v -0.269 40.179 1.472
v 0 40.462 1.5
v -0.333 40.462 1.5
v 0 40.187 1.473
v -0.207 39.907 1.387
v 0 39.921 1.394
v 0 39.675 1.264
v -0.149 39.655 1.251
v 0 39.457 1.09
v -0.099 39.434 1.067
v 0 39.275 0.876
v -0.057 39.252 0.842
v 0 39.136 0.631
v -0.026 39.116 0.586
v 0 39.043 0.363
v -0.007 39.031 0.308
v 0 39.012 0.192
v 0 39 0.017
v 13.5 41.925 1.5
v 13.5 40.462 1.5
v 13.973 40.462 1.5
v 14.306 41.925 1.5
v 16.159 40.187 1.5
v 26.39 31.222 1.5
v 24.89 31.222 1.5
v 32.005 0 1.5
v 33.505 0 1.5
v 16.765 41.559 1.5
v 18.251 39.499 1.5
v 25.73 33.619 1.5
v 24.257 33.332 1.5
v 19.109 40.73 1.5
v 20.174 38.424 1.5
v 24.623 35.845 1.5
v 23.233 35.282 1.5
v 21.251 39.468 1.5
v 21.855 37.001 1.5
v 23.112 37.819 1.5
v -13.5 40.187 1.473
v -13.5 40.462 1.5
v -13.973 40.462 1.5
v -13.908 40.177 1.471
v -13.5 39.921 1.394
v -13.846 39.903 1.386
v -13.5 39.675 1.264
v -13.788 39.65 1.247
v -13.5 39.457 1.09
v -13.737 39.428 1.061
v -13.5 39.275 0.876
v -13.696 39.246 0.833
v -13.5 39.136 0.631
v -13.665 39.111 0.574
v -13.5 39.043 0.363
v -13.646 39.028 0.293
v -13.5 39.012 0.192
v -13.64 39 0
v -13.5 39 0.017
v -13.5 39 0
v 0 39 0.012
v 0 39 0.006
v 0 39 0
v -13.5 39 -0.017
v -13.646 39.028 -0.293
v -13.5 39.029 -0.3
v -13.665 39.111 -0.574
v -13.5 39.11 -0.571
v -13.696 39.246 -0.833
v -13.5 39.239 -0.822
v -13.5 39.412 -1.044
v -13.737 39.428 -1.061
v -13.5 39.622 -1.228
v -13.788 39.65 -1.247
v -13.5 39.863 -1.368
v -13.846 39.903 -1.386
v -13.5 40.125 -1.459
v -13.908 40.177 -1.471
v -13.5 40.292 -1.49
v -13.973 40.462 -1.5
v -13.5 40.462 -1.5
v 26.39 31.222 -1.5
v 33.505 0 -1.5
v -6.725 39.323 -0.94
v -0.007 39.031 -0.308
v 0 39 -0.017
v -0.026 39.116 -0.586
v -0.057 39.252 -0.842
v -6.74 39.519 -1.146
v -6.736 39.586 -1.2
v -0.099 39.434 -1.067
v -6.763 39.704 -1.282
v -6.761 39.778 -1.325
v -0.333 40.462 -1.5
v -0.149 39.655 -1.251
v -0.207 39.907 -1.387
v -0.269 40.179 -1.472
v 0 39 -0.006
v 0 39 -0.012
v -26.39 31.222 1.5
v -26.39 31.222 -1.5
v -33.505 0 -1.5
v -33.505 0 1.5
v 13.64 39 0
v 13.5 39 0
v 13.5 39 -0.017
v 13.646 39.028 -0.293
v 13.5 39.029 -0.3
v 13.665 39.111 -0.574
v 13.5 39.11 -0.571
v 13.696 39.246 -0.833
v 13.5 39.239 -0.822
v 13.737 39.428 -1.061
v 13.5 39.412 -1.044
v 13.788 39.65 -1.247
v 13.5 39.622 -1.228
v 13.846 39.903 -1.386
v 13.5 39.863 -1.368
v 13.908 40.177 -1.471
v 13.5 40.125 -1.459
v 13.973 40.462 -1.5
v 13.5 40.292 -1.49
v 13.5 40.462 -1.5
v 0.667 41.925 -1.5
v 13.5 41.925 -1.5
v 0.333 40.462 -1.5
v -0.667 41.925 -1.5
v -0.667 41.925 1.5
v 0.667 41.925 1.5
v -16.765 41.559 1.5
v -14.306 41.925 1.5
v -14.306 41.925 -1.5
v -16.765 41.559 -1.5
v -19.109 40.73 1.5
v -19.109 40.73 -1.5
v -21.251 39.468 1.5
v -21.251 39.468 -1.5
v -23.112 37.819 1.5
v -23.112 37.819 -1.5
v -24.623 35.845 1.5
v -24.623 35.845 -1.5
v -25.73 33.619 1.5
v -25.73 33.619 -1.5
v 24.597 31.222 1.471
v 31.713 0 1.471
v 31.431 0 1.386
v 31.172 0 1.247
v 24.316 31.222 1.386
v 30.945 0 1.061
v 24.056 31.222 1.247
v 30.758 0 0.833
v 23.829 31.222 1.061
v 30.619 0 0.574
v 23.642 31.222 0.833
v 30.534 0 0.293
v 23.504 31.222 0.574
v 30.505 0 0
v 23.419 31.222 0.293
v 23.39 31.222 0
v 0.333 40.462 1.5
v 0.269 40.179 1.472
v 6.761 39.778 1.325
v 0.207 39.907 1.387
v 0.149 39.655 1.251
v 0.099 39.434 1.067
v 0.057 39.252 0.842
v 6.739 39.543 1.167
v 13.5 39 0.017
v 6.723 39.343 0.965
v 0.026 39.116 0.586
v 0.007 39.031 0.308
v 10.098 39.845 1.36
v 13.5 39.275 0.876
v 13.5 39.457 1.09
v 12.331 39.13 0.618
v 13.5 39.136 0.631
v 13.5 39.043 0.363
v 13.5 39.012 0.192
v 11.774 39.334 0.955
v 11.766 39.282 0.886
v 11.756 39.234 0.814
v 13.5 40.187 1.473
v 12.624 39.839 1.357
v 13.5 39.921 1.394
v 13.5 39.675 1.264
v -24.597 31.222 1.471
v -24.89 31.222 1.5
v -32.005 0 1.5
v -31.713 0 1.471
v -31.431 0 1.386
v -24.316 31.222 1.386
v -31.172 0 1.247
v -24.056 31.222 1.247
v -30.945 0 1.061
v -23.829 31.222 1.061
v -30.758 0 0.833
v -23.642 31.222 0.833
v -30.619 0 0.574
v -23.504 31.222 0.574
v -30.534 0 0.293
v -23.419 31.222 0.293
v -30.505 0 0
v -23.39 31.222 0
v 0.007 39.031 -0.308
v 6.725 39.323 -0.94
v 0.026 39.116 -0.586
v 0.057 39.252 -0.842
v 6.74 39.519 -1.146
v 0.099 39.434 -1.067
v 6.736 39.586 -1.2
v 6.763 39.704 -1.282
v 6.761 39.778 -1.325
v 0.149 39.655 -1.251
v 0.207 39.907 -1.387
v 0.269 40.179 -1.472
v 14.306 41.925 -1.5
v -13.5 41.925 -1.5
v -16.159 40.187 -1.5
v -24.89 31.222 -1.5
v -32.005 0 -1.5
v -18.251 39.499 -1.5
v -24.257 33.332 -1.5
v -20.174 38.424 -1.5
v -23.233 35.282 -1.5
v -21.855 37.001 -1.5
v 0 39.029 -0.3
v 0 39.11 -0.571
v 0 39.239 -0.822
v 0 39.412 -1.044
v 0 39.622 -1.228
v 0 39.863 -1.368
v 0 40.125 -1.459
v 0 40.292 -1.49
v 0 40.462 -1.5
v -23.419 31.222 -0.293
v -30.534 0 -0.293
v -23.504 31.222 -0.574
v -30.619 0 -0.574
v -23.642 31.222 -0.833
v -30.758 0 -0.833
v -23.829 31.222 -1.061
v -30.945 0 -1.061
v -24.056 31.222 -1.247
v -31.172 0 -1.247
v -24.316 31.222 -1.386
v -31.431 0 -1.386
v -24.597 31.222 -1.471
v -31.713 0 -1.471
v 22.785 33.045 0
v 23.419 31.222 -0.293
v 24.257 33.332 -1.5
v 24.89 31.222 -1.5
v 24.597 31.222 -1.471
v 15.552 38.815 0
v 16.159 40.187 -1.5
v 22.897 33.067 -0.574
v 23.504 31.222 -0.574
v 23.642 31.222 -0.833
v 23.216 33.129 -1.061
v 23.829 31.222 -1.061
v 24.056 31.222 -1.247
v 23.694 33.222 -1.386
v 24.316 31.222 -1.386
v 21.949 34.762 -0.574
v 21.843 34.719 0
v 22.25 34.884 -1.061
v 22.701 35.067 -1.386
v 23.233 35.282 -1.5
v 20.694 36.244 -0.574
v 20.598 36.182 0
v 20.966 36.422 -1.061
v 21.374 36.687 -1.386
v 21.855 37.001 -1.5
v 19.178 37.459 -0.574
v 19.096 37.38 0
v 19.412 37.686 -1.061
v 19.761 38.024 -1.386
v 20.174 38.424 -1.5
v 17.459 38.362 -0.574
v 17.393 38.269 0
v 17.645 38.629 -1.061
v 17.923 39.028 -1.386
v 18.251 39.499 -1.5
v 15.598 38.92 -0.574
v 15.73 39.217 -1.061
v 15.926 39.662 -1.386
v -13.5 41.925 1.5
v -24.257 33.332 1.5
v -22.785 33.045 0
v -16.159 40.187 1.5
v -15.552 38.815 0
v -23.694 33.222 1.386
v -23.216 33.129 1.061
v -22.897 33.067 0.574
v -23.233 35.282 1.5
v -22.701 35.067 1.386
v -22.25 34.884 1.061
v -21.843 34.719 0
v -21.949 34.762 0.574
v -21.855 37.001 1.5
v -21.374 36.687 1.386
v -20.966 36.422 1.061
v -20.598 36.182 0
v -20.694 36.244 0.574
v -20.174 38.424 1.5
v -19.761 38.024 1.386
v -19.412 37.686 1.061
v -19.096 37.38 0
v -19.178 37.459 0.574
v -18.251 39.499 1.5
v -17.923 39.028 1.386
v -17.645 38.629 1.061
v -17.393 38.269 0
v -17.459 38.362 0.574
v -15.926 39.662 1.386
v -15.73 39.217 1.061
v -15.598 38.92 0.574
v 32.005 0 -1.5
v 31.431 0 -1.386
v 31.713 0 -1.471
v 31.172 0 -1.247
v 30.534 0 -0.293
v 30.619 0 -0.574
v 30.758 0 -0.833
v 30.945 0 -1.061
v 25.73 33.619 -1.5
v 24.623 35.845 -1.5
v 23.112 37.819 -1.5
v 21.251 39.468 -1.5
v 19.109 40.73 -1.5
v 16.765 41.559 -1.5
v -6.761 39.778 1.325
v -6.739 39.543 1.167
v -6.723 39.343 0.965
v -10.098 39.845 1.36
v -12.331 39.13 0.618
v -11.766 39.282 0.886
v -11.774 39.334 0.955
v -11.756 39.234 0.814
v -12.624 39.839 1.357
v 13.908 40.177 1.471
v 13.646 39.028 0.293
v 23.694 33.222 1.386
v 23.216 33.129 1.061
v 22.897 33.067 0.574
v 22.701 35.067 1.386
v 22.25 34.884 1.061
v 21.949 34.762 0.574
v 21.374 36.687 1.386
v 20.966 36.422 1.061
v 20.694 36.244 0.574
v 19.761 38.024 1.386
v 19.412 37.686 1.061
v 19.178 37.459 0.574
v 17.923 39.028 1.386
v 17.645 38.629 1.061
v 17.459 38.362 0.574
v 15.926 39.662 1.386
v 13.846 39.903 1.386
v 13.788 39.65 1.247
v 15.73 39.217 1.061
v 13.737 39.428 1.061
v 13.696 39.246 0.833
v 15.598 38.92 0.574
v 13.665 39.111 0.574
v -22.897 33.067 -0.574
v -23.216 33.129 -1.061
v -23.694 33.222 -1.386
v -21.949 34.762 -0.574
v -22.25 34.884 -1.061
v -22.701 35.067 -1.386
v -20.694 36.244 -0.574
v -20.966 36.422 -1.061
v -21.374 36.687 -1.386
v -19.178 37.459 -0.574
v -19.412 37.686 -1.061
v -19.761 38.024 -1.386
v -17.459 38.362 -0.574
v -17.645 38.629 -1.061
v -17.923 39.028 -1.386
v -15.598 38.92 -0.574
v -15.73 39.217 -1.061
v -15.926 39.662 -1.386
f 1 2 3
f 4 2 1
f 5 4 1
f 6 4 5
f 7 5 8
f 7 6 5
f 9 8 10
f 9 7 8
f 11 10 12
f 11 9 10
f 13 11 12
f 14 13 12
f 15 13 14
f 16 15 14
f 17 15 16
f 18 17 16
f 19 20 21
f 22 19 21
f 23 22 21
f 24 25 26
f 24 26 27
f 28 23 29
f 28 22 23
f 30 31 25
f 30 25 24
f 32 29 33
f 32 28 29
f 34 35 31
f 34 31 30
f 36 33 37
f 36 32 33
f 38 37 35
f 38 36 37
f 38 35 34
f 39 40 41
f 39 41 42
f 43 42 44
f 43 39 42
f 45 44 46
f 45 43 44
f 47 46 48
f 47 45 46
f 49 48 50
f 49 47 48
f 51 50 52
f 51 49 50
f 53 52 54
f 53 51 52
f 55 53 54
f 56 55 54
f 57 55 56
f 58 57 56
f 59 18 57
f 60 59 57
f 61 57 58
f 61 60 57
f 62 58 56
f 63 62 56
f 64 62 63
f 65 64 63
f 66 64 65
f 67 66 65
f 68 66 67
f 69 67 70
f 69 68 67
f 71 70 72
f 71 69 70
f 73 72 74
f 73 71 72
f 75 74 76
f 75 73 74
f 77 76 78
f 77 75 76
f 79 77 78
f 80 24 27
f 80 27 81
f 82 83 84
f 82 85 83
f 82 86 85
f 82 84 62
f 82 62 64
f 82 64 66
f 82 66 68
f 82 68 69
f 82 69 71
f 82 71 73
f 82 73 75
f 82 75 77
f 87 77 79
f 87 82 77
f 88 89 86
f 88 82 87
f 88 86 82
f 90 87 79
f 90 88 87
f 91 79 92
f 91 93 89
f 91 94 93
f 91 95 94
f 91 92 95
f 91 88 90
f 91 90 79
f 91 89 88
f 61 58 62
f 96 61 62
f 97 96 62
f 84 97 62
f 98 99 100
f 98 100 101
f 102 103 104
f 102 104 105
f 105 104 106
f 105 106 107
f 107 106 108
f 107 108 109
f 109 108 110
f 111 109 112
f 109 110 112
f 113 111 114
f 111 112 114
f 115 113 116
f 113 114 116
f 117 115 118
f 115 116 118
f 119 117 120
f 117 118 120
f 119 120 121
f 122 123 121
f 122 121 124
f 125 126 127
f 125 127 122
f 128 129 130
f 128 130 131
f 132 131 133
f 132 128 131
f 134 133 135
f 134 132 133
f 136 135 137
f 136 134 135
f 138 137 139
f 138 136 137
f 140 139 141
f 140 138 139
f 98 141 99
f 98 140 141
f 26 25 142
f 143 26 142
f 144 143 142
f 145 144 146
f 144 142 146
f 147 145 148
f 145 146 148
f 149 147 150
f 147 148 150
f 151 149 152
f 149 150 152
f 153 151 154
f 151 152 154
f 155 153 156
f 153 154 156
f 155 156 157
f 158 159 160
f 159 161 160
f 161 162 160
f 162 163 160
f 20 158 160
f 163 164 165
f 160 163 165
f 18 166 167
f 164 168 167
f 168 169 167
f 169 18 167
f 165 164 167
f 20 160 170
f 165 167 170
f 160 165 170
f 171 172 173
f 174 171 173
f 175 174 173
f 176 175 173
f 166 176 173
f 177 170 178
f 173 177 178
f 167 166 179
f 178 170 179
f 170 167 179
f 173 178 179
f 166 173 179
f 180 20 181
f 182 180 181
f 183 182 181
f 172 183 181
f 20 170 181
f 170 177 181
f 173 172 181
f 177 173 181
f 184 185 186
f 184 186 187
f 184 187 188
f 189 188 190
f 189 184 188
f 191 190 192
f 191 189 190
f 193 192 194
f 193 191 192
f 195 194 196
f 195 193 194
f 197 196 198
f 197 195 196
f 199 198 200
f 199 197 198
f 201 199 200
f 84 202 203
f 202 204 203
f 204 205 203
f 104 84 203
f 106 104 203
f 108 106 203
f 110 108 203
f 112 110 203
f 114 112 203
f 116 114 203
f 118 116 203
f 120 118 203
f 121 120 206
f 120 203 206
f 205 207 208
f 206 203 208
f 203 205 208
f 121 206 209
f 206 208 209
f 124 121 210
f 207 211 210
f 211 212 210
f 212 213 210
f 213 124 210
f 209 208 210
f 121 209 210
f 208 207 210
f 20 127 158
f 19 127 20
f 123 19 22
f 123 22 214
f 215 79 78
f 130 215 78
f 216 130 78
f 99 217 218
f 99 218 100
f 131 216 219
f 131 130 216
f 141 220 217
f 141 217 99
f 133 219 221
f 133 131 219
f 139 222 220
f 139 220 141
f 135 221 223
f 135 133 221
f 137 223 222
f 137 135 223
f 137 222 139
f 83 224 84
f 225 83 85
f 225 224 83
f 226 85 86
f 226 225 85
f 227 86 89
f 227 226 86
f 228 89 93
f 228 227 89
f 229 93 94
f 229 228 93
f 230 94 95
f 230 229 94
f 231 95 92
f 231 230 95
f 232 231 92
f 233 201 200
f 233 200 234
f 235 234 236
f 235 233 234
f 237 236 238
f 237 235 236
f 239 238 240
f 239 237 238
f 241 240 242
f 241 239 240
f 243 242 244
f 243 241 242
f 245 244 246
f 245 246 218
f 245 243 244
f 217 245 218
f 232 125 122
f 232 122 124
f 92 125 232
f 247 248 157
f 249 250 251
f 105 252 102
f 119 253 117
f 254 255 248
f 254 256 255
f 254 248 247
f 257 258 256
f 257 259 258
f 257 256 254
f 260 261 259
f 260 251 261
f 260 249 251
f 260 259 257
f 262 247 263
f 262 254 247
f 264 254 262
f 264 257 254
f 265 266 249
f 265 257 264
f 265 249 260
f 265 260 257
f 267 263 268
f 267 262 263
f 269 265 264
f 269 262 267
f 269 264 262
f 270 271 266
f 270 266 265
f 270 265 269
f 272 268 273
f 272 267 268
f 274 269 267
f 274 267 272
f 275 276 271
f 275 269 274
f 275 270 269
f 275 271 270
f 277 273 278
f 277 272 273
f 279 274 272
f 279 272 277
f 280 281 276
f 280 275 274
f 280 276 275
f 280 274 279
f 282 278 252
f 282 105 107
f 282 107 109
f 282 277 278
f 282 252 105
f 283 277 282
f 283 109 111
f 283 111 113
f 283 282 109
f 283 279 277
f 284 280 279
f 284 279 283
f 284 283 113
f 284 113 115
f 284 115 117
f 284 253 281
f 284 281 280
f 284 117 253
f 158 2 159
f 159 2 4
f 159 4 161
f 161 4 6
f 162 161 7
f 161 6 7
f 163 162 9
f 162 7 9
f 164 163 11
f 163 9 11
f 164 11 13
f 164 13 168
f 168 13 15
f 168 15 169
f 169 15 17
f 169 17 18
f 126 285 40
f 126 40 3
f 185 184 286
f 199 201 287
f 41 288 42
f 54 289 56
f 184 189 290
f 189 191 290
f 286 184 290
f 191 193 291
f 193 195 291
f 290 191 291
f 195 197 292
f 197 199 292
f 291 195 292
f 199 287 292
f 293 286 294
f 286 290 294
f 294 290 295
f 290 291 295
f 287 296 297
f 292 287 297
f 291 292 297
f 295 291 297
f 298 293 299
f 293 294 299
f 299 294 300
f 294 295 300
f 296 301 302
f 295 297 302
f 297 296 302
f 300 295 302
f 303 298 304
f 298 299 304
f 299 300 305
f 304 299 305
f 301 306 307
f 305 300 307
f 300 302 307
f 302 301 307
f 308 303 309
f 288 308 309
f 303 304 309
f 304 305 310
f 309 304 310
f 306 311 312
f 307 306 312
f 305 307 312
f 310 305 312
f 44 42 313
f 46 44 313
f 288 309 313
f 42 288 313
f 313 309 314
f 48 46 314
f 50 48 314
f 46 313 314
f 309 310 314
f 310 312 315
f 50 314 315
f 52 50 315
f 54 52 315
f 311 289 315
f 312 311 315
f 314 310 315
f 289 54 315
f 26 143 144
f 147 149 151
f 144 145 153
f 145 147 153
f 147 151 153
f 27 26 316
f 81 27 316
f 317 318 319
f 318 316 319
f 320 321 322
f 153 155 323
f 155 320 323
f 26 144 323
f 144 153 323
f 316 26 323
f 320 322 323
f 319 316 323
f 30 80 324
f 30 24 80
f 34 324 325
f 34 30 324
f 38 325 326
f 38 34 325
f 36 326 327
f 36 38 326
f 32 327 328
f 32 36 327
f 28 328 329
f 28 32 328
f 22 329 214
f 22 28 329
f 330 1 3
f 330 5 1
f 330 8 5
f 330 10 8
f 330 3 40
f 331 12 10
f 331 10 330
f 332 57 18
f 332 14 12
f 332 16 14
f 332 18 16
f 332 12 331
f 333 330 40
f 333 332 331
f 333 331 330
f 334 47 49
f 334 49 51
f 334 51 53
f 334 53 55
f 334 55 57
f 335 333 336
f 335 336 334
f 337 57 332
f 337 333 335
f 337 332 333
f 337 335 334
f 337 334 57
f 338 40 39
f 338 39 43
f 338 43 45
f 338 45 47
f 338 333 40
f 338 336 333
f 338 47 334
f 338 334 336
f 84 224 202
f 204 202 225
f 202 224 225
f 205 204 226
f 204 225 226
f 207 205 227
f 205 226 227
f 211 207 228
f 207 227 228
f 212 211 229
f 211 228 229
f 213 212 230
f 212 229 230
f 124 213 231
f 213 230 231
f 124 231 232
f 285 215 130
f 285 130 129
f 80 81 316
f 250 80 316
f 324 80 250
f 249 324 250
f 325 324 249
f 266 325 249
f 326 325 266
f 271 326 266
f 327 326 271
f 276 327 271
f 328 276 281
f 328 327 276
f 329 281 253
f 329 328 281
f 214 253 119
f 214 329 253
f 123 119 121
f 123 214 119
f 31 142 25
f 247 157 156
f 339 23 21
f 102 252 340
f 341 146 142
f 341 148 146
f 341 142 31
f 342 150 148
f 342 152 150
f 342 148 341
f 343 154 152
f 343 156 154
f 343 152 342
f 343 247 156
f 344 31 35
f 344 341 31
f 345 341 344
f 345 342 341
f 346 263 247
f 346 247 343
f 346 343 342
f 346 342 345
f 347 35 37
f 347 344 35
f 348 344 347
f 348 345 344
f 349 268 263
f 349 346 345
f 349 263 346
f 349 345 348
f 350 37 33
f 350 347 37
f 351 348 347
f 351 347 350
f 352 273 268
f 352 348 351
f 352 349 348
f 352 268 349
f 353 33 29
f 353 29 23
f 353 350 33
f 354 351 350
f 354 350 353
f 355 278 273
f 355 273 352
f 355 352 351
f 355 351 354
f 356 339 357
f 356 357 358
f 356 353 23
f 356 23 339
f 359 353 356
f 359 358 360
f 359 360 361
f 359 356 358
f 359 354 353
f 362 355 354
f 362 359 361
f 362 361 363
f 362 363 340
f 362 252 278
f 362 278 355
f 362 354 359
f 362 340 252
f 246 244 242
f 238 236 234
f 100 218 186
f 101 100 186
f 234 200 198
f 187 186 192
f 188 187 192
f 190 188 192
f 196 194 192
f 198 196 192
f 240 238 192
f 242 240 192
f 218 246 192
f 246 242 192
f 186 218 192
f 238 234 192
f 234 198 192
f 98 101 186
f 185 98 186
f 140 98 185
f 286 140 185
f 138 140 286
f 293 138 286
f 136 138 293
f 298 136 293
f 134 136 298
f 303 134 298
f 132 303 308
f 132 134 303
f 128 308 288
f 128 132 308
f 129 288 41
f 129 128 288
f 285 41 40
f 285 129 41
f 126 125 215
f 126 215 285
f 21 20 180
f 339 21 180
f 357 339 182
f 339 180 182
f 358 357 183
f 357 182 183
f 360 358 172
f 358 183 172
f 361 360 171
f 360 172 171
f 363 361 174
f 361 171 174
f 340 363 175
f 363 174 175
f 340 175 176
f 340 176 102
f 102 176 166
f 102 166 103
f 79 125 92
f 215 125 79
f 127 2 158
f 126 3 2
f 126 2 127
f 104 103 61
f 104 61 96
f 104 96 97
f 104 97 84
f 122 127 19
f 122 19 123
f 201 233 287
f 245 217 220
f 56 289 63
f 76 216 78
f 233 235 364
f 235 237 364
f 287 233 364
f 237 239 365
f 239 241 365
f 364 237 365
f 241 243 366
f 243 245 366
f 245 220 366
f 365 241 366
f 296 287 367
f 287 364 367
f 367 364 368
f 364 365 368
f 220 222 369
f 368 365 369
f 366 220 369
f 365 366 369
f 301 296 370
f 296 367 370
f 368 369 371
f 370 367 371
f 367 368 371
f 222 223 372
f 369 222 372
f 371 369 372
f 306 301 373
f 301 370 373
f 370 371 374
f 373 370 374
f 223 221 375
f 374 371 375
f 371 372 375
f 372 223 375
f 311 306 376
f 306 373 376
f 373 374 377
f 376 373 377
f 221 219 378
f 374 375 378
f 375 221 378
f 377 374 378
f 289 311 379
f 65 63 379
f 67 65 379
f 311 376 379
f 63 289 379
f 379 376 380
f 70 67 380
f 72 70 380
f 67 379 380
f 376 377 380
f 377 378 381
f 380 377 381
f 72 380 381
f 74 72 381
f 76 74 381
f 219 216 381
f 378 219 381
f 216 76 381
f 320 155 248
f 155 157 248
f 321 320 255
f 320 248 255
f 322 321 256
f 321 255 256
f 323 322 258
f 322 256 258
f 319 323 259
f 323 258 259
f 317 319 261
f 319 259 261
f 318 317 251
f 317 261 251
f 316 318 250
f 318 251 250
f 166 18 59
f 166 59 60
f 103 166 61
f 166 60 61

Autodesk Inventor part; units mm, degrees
ref_plane "YZ Plane" through (0, 0, 0) normal (1, 0, 0) x (0, 1, 0)
ref_plane "XZ Plane" through (0, 0, 0) normal (0, 1, 0) x (-1, 0, 0)
ref_plane "XY Plane" through (0, 0, 0) normal (0, 0, 1) x (1, 0, 0)
sketch "Sketch1" plane through (0, 0, 0) normal (0, 0, 1) x (1, 0, 0)
  line L0 (0, 41) -> (0, -27)
  line L1 (-30.5054, 0) -> (-23.3898, 31.222)
  line L2 (-13.6398, 39) -> (0, 39)
  arc A0 (-13.6398, 39) -> (-23.3898, 31.222) centre (-13.6398, 29) ccw
  line L3 (0, -40.6) -> (0, 54.6) projected
  line L4 (-36.6064, 0) -> (6.1011, 0) projected
  point P0 (0, 0)
  point P1 (-21.6172, 39)
  dimension "d2" = 21.6172
  dimension "d3" = 40
  dimension "d4" = 10
  dimension "d6" = 39
sketch "Sketch2" plane through (0, 0, 0) normal (0, 1, 0) x (-1, 0, 0)
  circle A0 centre (32.0053, 0) radius 1.5
  line L0 (33.5053, 1.5) -> (32.0053, 1.5)
  line L1 (32.0053, -1.5) -> (33.5053, -1.5)
  line L2 (33.5053, -1.5) -> (33.5053, 1.5)
  line L3 (40.2063, 0) -> (-6.7011, 0) projected
  point P0 (0, 0)
  point P1 (33.5053, 0)
  dimension "d5" = 3
sweep "Sweep1" add profiles "Sketch2" path "Sketch1" path curves L1 A0 L2
mirror "Mirror1" about plane through (0, 0, 0) normal (1, 0, 0) of "Sweep1"
sketch "Sketch4" plane through (0, 0, 0) normal (1, 0, 0) x (0, 1, 0)
  line L0 (39, 0.0174) -> (39, -0.0174) projected
  ellipse E0 centre (40.4624, 0) end of major axis (40.4624, 1.5) minor radius 1.4625 (40.4624, 1.5) -> (39, 0.0174) ccw projected
  line L1 (40.4624, 1.5) -> (41.9249, 1.5)
  line L2 (41.9249, 1.5) -> (41.9249, -1.5)
  line L3 (41.9249, -1.5) -> (40.4624, -1.5)
  line L4 (31.222, 1.5) -> (31.222, -1.5) projected
  ellipse E1 centre (40.4624, 0) end of major axis (40.4624, 1.5) minor radius 1.4625 (40.4624, 1.5) -> (40.4624, -1.5) ccw projected
  line L5 (31.222, -1.5) -> (40.4624, -1.5) projected
  line L6 (31.222, 1.5) -> (40.4624, 1.5) projected
  line L7 (41.9249, 1.5) -> (40.4624, 1.5) projected
  line L8 (41.9249, -1.5) -> (41.9249, 1.5) projected
  line L9 (40.4624, -1.5) -> (41.9249, -1.5) projected
  ellipse E2 centre (40.4624, 0) end of major axis (40.4624, 1.5) minor radius 1.4625 (39, -0.0174) -> (40.4624, -1.5) ccw projected
  point P0 (0, 0)
  point P1 (41.9249, 0)
extrude "Extrusion1" add sketch "Sketch4" along normal mid plane 27 contours E0 L1 L2 L3 E1 L0
properties part number "McCrea_noha_walle"
